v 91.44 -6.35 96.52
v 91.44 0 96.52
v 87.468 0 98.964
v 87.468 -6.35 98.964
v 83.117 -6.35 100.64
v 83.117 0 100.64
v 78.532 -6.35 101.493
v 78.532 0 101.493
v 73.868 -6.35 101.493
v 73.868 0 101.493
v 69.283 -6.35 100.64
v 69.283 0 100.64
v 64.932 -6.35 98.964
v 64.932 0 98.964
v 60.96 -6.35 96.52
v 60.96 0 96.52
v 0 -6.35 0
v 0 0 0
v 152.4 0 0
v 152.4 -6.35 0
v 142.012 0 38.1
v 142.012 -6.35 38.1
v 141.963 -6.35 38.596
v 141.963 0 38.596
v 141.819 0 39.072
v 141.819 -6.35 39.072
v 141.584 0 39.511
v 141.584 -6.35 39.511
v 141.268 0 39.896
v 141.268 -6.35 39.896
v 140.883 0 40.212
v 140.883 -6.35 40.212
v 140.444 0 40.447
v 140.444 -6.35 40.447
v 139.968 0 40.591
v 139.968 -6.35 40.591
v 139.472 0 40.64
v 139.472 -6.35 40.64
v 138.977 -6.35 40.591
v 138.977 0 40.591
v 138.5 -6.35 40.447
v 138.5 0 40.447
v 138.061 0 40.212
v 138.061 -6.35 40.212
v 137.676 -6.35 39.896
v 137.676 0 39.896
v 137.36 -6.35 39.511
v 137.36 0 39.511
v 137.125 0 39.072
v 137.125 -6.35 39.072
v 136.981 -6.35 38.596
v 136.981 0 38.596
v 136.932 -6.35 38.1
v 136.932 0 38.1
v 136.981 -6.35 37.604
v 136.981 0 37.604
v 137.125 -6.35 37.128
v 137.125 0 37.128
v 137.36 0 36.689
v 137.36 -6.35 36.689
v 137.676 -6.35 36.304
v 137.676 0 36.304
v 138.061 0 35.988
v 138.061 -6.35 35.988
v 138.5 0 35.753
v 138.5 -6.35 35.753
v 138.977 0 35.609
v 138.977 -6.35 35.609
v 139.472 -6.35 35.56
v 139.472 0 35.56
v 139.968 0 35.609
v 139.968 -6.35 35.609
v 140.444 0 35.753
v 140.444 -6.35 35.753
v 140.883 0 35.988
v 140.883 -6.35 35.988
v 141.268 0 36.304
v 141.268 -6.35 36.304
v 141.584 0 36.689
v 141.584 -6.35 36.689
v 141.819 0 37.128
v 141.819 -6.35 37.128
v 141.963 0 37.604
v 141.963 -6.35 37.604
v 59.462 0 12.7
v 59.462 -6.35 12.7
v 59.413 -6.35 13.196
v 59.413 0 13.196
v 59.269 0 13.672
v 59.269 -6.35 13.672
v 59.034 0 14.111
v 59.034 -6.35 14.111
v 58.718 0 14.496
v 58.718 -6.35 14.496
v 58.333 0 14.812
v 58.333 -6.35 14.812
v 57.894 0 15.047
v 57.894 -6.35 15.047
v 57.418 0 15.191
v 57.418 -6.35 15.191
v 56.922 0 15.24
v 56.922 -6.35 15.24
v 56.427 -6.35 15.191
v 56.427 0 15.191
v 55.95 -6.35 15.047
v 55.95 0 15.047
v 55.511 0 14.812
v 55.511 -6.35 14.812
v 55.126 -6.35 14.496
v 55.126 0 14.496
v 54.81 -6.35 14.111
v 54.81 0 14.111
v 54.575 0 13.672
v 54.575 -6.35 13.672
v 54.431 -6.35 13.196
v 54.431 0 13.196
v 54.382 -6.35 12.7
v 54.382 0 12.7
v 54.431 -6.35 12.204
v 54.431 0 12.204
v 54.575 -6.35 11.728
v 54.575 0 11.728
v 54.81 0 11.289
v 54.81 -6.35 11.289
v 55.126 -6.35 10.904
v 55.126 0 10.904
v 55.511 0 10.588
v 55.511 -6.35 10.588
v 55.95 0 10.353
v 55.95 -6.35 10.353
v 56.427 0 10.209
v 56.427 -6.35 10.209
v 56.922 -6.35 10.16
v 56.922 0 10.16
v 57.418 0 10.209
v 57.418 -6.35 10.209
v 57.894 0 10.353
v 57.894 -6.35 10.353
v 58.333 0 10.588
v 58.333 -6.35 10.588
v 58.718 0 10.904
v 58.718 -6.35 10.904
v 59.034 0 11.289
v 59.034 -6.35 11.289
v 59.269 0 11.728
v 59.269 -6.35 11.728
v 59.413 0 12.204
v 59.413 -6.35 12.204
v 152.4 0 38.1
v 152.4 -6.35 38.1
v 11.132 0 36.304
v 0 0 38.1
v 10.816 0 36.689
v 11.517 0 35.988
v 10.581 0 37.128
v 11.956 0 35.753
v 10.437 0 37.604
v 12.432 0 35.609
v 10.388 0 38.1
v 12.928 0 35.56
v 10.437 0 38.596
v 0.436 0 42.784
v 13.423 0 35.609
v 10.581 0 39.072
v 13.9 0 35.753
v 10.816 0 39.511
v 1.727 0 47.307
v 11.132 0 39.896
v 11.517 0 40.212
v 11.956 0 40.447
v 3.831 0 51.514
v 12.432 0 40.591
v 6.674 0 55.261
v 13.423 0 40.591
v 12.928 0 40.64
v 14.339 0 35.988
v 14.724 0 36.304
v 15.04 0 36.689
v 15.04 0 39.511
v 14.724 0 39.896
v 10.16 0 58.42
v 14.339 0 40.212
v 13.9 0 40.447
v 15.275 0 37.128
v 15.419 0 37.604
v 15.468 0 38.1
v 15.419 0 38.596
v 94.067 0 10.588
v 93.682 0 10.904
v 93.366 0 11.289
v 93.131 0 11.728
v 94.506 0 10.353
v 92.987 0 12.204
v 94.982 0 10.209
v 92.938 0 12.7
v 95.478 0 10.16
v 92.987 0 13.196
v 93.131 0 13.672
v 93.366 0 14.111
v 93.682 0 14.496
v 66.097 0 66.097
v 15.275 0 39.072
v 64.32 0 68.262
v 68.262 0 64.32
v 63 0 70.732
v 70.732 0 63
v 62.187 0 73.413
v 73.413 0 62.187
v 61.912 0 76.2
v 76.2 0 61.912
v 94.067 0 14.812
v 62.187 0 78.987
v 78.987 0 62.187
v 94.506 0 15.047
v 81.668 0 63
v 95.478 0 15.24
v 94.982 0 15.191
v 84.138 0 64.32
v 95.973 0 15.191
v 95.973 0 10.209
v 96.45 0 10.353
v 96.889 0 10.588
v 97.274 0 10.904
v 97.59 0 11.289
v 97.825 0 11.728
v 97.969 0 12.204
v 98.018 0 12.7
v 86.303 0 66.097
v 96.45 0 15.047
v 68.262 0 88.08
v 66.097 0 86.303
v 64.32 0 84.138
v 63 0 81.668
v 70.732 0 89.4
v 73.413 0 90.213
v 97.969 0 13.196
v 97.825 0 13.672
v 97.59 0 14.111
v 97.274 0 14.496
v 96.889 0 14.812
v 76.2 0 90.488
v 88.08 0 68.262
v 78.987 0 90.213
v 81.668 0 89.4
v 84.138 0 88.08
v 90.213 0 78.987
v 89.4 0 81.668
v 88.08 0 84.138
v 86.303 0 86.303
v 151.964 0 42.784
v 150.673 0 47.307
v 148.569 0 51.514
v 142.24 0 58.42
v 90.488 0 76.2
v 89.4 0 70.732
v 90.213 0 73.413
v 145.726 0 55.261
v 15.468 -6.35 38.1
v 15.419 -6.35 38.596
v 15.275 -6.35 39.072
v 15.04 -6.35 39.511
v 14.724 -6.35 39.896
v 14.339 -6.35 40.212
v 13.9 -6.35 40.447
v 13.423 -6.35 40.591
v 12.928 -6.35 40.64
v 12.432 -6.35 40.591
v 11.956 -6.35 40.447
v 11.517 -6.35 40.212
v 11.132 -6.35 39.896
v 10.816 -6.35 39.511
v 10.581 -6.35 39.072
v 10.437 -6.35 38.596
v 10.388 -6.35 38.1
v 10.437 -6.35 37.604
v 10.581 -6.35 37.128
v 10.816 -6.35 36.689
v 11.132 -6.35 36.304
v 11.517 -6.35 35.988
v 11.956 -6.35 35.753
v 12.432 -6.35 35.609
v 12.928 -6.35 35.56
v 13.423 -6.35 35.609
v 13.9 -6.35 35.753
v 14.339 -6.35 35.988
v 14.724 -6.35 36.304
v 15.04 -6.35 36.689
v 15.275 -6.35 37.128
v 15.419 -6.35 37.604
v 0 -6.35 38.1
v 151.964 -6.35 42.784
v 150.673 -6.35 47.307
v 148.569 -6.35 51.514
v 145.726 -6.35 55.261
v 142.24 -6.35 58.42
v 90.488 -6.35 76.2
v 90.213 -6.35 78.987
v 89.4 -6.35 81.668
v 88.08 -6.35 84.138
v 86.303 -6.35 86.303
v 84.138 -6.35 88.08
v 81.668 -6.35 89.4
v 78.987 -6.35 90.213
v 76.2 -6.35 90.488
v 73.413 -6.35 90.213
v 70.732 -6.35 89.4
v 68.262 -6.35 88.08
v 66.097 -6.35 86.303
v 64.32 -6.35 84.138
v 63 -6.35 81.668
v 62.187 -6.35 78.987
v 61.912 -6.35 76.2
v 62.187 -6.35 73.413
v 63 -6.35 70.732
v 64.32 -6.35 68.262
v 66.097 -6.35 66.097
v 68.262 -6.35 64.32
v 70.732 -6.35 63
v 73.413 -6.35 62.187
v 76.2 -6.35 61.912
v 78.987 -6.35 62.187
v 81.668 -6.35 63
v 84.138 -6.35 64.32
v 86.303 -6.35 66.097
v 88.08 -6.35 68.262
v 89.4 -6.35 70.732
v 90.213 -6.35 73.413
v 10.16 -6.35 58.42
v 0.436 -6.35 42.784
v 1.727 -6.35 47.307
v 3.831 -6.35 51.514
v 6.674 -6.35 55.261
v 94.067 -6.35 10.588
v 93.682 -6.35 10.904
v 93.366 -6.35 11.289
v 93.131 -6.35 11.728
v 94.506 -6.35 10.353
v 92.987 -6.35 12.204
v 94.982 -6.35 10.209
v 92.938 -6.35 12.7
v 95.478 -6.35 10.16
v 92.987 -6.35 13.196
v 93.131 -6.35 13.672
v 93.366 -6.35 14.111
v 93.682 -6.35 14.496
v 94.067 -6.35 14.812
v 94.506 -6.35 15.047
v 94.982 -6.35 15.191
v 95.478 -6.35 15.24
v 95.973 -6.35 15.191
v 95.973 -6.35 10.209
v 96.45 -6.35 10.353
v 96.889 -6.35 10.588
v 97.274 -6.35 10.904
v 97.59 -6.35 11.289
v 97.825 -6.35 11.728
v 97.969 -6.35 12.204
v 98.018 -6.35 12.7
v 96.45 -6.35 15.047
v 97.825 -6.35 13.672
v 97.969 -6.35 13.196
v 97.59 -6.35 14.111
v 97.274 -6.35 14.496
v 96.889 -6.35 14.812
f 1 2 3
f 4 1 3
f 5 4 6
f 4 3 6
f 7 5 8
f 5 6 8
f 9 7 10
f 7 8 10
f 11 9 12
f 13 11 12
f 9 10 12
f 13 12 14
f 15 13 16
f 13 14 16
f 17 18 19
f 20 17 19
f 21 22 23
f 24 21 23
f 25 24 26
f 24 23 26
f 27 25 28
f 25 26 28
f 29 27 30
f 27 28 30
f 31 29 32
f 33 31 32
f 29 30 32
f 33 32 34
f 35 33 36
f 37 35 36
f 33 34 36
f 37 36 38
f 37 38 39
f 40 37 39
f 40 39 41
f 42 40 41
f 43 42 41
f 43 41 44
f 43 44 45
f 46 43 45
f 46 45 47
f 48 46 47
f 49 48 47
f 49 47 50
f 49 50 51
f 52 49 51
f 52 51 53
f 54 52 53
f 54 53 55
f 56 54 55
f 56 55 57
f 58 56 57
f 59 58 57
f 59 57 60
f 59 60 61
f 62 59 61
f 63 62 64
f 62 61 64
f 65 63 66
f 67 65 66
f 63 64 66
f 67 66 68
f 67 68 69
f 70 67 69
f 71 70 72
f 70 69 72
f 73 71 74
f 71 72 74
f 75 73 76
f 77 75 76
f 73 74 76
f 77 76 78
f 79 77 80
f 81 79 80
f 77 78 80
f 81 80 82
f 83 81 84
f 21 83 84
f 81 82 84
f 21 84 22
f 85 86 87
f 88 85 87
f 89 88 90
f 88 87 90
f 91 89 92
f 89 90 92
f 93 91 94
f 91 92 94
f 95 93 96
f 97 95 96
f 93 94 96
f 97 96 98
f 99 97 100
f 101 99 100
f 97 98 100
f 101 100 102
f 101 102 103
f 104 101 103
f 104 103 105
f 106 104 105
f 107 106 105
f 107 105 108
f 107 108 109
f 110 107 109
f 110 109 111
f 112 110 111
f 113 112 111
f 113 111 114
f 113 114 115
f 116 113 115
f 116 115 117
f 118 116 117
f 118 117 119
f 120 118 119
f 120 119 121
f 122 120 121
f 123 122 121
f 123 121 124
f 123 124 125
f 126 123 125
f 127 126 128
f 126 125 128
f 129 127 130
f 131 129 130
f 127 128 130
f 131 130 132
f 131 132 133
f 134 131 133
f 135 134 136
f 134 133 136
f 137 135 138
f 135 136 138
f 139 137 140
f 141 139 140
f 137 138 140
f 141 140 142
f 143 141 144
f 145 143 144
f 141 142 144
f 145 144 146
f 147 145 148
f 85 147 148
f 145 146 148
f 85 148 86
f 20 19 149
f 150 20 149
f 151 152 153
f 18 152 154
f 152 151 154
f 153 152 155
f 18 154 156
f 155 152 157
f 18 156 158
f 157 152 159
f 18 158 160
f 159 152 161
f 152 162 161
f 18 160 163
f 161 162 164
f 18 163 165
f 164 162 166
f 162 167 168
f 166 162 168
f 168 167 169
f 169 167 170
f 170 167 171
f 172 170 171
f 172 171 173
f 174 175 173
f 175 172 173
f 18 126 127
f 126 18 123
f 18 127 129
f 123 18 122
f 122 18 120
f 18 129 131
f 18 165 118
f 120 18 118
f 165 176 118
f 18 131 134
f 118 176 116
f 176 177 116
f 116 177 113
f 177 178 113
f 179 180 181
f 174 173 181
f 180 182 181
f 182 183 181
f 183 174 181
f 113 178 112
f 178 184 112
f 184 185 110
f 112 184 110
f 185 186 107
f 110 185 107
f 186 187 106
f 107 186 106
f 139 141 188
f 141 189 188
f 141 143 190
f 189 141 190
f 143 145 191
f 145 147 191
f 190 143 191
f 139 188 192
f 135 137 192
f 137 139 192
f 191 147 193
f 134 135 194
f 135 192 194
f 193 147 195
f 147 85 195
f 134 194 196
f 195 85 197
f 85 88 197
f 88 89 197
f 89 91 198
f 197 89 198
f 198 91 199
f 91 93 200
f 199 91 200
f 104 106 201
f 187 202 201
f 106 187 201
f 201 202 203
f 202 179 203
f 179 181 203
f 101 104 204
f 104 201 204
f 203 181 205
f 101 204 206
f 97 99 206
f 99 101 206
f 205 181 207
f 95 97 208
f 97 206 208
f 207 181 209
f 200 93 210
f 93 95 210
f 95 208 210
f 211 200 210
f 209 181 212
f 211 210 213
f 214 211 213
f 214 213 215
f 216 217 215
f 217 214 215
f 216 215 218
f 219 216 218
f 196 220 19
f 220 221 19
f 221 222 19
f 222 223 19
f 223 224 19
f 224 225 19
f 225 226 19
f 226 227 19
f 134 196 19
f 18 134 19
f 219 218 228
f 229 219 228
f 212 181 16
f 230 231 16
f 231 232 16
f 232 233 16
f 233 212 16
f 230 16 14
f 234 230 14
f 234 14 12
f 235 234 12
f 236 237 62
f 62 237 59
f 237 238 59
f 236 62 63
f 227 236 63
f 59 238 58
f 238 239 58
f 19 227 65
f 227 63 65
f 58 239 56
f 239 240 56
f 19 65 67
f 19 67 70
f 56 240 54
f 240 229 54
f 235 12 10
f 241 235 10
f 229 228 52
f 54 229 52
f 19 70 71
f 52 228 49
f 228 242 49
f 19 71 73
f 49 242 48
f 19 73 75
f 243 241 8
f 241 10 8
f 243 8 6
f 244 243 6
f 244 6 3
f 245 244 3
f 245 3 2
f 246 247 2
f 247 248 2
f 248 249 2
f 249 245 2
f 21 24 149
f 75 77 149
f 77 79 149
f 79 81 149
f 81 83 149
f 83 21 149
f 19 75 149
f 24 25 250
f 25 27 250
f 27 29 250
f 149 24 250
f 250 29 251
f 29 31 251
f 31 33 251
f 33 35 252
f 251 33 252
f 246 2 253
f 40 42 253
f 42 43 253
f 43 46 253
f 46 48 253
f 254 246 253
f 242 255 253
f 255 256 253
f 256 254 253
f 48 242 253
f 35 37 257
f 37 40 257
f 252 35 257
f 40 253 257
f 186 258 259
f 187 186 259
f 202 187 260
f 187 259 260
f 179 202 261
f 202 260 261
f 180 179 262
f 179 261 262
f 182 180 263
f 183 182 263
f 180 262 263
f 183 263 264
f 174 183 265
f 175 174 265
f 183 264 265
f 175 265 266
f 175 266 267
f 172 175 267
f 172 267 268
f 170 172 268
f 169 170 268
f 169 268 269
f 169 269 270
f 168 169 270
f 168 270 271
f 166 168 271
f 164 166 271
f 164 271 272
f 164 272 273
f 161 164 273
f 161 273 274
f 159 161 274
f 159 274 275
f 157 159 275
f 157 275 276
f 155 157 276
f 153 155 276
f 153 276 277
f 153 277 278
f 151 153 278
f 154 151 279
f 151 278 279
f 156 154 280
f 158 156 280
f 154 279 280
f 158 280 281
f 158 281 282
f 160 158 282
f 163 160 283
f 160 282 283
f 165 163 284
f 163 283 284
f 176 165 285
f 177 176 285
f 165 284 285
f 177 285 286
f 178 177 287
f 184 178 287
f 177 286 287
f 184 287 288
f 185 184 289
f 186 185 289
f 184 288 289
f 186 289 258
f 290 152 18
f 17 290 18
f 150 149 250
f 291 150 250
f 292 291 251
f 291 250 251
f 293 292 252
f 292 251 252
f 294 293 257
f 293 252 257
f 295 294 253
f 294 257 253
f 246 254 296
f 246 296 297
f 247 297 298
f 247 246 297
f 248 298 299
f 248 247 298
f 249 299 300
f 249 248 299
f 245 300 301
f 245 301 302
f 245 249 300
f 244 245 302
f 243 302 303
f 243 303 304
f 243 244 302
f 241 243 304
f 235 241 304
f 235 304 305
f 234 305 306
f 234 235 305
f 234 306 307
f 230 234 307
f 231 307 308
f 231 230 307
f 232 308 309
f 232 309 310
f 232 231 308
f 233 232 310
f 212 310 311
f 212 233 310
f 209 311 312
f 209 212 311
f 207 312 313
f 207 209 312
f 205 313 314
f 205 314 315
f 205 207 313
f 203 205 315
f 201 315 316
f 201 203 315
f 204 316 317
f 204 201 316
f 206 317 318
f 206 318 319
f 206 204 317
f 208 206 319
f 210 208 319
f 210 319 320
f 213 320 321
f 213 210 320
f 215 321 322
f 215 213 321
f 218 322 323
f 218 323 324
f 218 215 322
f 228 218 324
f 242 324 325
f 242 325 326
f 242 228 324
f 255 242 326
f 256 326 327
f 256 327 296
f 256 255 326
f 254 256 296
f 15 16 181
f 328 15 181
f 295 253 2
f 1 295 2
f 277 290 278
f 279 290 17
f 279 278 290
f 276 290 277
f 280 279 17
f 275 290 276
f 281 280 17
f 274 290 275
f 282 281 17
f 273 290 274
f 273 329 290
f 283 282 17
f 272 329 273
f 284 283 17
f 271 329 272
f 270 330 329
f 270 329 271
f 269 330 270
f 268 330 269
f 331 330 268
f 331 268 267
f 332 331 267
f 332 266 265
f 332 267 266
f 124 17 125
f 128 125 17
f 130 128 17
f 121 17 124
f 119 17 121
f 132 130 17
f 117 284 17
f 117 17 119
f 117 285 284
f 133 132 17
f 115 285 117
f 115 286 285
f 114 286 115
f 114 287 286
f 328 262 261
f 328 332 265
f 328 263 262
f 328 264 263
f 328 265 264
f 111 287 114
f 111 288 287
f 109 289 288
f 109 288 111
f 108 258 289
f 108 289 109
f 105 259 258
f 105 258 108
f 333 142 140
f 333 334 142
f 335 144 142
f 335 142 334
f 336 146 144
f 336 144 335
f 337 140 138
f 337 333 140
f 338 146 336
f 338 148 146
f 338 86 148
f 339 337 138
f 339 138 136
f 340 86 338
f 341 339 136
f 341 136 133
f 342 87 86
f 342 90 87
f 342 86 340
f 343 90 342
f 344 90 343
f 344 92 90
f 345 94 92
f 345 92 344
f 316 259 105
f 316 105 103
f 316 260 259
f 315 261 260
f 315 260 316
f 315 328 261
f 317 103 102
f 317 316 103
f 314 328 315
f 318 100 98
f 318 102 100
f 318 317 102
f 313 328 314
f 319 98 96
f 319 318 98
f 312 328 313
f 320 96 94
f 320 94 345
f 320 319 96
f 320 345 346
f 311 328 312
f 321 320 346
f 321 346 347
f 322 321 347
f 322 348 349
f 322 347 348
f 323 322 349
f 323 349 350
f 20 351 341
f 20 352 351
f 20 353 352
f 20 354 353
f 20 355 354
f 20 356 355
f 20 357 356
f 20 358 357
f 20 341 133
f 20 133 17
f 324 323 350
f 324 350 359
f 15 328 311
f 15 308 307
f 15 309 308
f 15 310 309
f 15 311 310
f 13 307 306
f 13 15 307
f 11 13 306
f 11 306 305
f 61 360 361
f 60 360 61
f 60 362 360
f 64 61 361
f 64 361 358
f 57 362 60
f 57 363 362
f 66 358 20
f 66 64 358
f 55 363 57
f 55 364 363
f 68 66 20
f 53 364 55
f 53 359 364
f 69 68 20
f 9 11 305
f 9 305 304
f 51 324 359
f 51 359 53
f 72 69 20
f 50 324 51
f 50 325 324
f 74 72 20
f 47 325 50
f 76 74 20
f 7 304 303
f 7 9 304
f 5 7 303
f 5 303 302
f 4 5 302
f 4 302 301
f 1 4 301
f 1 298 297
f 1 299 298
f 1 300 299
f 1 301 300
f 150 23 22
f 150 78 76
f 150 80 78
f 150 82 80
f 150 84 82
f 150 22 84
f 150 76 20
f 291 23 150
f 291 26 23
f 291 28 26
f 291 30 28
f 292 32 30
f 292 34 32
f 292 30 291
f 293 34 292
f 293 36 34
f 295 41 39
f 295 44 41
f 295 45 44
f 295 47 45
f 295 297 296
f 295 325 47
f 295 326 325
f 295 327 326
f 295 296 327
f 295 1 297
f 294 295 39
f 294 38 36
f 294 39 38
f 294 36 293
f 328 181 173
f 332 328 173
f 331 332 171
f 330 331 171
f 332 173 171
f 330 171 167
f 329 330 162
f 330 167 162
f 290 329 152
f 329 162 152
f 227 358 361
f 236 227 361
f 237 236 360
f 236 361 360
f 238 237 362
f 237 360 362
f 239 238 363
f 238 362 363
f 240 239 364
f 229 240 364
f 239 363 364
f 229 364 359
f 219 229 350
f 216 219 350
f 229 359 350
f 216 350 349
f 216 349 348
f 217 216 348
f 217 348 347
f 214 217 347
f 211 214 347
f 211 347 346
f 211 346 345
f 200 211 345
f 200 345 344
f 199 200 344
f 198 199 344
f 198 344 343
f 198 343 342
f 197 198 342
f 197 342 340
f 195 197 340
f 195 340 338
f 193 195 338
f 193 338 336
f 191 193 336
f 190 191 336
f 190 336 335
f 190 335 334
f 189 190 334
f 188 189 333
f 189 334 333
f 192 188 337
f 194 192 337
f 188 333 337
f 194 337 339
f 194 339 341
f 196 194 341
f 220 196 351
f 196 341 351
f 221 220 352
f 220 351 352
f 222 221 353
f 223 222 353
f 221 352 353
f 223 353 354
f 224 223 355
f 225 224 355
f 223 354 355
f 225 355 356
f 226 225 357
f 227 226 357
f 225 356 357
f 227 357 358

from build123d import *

# Parameters (mm, degrees)
F0_R     = 14.2875
F1_DEPTH = 6.35
F2_R     = 2.54
F3_DEPTH = 6.351


with BuildPart() as f1:
    # F0 (on Front) → F1 (new body)
    with BuildSketch(Plane.XZ):
        with BuildLine():
            Line((0, 38.1), (0, 0))
            Line((0, 0), (152.4, 0))
            Line((152.4, 0), (152.4, 38.1))
            ThreePointArc((152.4, 38.1), (149.718451, 49.459225), (142.24, 58.42))
            Line((142.24, 58.42), (91.44, 96.52))
            ThreePointArc((91.44, 96.52), (76.2, 101.6), (60.96, 96.52))
            Line((60.96, 96.52), (10.16, 58.42))
            ThreePointArc((10.16, 58.42), (2.681549, 49.459225), (0, 38.1))
        make_face()
        with Locations((76.2, 76.2)):
            Circle(F0_R, mode=Mode.SUBTRACT)
    extrude(amount=F1_DEPTH)

    # F2 (on face) → F3 (cut, through all)
    with BuildSketch(Plane.XZ.offset(6.35)):
        with Locations((12.927955, 38.1)):
            Circle(F2_R)
        with Locations((56.922045, 12.7)):
            Circle(F2_R)
        with Locations((95.477955, 12.7)):
            Circle(F2_R)
        with Locations((139.472045, 38.1)):
            Circle(F2_R)
    extrude(amount=-F3_DEPTH, mode=Mode.SUBTRACT)


solid = f1.part
